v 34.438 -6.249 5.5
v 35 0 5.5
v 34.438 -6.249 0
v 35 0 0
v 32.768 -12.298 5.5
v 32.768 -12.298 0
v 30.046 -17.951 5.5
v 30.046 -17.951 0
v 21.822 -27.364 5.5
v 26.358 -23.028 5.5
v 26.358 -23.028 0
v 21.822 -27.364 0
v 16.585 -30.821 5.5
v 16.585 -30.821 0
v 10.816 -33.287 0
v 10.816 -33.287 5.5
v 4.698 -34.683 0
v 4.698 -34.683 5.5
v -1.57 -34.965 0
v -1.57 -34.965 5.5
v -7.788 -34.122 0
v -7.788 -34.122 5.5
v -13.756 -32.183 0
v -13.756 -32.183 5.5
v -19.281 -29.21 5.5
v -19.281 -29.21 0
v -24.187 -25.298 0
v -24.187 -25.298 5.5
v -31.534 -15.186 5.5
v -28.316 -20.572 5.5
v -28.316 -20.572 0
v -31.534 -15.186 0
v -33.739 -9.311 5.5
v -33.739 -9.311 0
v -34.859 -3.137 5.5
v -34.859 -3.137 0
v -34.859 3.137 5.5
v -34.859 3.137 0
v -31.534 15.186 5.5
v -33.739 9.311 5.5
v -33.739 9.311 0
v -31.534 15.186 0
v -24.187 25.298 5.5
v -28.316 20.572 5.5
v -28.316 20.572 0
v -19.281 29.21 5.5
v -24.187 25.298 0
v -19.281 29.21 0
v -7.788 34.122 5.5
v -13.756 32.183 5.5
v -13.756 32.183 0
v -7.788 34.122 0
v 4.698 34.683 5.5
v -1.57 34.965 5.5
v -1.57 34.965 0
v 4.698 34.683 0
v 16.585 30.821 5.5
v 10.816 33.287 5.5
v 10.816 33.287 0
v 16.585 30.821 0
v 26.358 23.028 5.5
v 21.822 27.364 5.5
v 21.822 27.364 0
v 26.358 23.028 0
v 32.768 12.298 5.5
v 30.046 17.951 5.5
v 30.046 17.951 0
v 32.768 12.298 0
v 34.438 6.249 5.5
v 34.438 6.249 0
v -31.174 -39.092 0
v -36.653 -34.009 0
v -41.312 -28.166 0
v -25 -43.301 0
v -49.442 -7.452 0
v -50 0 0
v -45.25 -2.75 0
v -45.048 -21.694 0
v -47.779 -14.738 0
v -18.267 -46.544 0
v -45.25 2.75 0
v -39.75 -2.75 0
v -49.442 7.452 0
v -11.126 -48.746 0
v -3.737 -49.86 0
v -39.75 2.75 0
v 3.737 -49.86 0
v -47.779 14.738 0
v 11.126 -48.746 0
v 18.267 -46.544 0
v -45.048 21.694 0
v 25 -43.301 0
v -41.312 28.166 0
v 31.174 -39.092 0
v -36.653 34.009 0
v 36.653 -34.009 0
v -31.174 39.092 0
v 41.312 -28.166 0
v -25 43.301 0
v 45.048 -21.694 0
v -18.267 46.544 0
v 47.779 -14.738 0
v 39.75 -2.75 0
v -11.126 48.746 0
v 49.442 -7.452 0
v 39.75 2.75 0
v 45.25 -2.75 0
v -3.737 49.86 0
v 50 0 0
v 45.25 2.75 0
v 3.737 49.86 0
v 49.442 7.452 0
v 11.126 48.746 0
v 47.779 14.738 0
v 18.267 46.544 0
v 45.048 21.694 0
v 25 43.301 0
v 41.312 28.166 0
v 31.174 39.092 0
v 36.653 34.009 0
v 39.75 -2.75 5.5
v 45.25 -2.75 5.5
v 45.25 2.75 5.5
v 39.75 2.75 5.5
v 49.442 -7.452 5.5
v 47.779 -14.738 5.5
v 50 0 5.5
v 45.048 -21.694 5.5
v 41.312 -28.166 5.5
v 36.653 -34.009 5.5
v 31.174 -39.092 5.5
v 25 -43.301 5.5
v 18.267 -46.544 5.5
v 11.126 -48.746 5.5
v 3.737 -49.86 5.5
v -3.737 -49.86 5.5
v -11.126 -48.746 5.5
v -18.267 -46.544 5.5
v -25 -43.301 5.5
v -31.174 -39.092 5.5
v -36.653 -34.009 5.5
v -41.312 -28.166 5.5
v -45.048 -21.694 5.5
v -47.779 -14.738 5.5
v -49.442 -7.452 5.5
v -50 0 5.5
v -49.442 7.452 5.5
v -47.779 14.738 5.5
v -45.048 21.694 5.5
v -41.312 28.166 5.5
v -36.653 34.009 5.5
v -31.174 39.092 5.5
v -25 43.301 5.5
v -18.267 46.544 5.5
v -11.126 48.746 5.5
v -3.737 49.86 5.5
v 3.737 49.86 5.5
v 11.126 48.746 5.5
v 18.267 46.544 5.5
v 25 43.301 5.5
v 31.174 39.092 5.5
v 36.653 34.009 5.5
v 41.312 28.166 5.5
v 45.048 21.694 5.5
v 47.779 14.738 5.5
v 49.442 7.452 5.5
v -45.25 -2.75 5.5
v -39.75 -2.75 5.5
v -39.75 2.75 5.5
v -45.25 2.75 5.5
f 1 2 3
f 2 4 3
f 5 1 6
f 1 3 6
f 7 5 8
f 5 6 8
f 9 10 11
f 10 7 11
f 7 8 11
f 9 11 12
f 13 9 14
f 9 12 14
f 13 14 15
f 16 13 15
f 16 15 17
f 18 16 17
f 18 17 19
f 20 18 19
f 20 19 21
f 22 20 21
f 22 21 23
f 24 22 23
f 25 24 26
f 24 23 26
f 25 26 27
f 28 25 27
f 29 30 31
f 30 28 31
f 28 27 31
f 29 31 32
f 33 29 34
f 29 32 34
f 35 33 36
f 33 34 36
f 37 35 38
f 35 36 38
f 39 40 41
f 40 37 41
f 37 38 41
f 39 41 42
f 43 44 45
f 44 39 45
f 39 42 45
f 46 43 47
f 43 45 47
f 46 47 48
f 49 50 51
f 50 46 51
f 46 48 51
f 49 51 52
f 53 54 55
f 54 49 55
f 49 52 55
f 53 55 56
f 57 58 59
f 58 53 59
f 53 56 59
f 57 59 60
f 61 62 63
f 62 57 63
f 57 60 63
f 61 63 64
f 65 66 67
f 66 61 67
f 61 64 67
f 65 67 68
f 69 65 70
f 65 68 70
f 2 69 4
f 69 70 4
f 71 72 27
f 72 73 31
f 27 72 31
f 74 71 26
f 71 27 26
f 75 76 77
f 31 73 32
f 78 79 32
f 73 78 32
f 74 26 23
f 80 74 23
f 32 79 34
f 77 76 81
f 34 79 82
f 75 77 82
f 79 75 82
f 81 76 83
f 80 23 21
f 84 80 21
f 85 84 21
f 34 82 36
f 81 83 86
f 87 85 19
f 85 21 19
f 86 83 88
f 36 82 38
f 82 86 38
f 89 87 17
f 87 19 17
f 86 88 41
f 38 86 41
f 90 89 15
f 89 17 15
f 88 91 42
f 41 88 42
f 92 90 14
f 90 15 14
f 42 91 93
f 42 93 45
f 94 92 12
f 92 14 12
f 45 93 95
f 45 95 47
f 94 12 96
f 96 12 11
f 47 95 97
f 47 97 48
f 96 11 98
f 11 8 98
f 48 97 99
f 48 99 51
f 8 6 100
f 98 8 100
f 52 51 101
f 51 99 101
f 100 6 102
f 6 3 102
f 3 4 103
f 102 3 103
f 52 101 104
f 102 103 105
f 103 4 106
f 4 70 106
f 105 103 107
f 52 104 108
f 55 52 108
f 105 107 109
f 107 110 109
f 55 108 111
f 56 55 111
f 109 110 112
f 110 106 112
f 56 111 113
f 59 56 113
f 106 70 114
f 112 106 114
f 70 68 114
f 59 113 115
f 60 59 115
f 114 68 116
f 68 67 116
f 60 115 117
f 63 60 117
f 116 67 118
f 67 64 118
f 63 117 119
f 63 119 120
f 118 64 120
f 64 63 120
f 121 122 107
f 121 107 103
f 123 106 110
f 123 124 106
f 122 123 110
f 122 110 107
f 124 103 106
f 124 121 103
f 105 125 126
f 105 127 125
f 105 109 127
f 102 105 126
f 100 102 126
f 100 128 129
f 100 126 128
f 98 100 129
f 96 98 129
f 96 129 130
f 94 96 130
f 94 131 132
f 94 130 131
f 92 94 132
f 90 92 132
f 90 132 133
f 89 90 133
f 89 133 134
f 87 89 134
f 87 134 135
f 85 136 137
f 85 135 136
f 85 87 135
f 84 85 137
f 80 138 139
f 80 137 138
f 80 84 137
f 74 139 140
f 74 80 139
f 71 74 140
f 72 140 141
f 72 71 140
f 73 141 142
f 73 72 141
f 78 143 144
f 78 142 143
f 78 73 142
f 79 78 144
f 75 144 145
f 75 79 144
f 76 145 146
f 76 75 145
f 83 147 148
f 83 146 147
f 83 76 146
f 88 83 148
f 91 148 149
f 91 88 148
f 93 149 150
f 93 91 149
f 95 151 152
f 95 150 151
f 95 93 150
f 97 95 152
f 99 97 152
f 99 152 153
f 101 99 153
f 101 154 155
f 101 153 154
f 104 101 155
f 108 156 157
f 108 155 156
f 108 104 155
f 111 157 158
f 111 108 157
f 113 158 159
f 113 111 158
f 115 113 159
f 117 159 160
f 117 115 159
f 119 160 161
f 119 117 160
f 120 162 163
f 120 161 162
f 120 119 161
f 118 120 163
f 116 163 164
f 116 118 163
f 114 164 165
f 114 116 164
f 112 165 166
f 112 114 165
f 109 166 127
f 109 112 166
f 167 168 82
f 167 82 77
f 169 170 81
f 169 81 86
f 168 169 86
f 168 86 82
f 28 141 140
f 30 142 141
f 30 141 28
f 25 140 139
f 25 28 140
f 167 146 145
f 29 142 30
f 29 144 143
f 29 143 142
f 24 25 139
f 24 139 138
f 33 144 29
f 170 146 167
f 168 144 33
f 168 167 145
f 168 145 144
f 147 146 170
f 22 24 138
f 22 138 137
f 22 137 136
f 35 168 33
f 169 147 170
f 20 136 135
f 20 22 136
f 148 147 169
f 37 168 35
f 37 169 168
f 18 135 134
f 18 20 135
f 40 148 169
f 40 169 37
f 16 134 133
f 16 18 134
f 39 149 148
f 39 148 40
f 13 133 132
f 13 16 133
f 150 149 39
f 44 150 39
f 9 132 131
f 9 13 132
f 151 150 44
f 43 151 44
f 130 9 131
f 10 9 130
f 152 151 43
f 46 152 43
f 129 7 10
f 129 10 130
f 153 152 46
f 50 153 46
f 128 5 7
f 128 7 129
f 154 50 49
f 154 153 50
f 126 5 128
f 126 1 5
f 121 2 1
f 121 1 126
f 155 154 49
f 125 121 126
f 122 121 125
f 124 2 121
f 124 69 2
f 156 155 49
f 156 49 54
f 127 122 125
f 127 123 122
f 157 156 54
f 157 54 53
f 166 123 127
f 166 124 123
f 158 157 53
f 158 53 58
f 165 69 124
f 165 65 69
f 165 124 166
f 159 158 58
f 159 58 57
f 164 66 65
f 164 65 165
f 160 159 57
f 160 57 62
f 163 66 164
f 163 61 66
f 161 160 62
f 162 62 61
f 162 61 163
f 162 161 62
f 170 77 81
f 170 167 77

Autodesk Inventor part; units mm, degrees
ref_plane "YZ Plane" through (0, 0, 0) normal (1, 0, 0) x (0, 1, 0)
ref_plane "XZ Plane" through (0, 0, 0) normal (0, 1, 0) x (-1, 0, 0)
ref_plane "XY Plane" through (0, 0, 0) normal (0, 0, 1) x (1, 0, 0)
sketch "Sketch1" plane through (0, 0, 0) normal (0, 0, 1) x (1, 0, 0)
  circle A0 centre (0, 0) radius 50
  circle A1 centre (0, 0) radius 35
  dimension "d0" = 100
  dimension "d1" = 70
extrude "Extrusion1" add sketch "Sketch1" along normal blind 5.5
sketch "Sketch4" plane through (0, 0, 5.5) normal (0, 0, 1) x (1, 0, 0)
  line L0 (39.75, 2.75) -> (45.25, 2.75)
  line L1 (45.25, 2.75) -> (45.25, -2.75)
  line L2 (45.25, -2.75) -> (39.75, -2.75)
  line L3 (39.75, -2.75) -> (39.75, 2.75)
  line L4 (-39.75, -2.75) -> (-45.25, -2.75)
  line L5 (-45.25, -2.75) -> (-45.25, 2.75)
  line L6 (-45.25, 2.75) -> (-39.75, 2.75)
  line L7 (-39.75, 2.75) -> (-39.75, -2.75)
  point P0 (0, 0)
  dimension "d13" = 5.5
  dimension "d14" = 5.5
  dimension "d17" = 360
extrude "Extrusion3" cut sketch "Sketch4" against normal blind 10
properties part number "central"
